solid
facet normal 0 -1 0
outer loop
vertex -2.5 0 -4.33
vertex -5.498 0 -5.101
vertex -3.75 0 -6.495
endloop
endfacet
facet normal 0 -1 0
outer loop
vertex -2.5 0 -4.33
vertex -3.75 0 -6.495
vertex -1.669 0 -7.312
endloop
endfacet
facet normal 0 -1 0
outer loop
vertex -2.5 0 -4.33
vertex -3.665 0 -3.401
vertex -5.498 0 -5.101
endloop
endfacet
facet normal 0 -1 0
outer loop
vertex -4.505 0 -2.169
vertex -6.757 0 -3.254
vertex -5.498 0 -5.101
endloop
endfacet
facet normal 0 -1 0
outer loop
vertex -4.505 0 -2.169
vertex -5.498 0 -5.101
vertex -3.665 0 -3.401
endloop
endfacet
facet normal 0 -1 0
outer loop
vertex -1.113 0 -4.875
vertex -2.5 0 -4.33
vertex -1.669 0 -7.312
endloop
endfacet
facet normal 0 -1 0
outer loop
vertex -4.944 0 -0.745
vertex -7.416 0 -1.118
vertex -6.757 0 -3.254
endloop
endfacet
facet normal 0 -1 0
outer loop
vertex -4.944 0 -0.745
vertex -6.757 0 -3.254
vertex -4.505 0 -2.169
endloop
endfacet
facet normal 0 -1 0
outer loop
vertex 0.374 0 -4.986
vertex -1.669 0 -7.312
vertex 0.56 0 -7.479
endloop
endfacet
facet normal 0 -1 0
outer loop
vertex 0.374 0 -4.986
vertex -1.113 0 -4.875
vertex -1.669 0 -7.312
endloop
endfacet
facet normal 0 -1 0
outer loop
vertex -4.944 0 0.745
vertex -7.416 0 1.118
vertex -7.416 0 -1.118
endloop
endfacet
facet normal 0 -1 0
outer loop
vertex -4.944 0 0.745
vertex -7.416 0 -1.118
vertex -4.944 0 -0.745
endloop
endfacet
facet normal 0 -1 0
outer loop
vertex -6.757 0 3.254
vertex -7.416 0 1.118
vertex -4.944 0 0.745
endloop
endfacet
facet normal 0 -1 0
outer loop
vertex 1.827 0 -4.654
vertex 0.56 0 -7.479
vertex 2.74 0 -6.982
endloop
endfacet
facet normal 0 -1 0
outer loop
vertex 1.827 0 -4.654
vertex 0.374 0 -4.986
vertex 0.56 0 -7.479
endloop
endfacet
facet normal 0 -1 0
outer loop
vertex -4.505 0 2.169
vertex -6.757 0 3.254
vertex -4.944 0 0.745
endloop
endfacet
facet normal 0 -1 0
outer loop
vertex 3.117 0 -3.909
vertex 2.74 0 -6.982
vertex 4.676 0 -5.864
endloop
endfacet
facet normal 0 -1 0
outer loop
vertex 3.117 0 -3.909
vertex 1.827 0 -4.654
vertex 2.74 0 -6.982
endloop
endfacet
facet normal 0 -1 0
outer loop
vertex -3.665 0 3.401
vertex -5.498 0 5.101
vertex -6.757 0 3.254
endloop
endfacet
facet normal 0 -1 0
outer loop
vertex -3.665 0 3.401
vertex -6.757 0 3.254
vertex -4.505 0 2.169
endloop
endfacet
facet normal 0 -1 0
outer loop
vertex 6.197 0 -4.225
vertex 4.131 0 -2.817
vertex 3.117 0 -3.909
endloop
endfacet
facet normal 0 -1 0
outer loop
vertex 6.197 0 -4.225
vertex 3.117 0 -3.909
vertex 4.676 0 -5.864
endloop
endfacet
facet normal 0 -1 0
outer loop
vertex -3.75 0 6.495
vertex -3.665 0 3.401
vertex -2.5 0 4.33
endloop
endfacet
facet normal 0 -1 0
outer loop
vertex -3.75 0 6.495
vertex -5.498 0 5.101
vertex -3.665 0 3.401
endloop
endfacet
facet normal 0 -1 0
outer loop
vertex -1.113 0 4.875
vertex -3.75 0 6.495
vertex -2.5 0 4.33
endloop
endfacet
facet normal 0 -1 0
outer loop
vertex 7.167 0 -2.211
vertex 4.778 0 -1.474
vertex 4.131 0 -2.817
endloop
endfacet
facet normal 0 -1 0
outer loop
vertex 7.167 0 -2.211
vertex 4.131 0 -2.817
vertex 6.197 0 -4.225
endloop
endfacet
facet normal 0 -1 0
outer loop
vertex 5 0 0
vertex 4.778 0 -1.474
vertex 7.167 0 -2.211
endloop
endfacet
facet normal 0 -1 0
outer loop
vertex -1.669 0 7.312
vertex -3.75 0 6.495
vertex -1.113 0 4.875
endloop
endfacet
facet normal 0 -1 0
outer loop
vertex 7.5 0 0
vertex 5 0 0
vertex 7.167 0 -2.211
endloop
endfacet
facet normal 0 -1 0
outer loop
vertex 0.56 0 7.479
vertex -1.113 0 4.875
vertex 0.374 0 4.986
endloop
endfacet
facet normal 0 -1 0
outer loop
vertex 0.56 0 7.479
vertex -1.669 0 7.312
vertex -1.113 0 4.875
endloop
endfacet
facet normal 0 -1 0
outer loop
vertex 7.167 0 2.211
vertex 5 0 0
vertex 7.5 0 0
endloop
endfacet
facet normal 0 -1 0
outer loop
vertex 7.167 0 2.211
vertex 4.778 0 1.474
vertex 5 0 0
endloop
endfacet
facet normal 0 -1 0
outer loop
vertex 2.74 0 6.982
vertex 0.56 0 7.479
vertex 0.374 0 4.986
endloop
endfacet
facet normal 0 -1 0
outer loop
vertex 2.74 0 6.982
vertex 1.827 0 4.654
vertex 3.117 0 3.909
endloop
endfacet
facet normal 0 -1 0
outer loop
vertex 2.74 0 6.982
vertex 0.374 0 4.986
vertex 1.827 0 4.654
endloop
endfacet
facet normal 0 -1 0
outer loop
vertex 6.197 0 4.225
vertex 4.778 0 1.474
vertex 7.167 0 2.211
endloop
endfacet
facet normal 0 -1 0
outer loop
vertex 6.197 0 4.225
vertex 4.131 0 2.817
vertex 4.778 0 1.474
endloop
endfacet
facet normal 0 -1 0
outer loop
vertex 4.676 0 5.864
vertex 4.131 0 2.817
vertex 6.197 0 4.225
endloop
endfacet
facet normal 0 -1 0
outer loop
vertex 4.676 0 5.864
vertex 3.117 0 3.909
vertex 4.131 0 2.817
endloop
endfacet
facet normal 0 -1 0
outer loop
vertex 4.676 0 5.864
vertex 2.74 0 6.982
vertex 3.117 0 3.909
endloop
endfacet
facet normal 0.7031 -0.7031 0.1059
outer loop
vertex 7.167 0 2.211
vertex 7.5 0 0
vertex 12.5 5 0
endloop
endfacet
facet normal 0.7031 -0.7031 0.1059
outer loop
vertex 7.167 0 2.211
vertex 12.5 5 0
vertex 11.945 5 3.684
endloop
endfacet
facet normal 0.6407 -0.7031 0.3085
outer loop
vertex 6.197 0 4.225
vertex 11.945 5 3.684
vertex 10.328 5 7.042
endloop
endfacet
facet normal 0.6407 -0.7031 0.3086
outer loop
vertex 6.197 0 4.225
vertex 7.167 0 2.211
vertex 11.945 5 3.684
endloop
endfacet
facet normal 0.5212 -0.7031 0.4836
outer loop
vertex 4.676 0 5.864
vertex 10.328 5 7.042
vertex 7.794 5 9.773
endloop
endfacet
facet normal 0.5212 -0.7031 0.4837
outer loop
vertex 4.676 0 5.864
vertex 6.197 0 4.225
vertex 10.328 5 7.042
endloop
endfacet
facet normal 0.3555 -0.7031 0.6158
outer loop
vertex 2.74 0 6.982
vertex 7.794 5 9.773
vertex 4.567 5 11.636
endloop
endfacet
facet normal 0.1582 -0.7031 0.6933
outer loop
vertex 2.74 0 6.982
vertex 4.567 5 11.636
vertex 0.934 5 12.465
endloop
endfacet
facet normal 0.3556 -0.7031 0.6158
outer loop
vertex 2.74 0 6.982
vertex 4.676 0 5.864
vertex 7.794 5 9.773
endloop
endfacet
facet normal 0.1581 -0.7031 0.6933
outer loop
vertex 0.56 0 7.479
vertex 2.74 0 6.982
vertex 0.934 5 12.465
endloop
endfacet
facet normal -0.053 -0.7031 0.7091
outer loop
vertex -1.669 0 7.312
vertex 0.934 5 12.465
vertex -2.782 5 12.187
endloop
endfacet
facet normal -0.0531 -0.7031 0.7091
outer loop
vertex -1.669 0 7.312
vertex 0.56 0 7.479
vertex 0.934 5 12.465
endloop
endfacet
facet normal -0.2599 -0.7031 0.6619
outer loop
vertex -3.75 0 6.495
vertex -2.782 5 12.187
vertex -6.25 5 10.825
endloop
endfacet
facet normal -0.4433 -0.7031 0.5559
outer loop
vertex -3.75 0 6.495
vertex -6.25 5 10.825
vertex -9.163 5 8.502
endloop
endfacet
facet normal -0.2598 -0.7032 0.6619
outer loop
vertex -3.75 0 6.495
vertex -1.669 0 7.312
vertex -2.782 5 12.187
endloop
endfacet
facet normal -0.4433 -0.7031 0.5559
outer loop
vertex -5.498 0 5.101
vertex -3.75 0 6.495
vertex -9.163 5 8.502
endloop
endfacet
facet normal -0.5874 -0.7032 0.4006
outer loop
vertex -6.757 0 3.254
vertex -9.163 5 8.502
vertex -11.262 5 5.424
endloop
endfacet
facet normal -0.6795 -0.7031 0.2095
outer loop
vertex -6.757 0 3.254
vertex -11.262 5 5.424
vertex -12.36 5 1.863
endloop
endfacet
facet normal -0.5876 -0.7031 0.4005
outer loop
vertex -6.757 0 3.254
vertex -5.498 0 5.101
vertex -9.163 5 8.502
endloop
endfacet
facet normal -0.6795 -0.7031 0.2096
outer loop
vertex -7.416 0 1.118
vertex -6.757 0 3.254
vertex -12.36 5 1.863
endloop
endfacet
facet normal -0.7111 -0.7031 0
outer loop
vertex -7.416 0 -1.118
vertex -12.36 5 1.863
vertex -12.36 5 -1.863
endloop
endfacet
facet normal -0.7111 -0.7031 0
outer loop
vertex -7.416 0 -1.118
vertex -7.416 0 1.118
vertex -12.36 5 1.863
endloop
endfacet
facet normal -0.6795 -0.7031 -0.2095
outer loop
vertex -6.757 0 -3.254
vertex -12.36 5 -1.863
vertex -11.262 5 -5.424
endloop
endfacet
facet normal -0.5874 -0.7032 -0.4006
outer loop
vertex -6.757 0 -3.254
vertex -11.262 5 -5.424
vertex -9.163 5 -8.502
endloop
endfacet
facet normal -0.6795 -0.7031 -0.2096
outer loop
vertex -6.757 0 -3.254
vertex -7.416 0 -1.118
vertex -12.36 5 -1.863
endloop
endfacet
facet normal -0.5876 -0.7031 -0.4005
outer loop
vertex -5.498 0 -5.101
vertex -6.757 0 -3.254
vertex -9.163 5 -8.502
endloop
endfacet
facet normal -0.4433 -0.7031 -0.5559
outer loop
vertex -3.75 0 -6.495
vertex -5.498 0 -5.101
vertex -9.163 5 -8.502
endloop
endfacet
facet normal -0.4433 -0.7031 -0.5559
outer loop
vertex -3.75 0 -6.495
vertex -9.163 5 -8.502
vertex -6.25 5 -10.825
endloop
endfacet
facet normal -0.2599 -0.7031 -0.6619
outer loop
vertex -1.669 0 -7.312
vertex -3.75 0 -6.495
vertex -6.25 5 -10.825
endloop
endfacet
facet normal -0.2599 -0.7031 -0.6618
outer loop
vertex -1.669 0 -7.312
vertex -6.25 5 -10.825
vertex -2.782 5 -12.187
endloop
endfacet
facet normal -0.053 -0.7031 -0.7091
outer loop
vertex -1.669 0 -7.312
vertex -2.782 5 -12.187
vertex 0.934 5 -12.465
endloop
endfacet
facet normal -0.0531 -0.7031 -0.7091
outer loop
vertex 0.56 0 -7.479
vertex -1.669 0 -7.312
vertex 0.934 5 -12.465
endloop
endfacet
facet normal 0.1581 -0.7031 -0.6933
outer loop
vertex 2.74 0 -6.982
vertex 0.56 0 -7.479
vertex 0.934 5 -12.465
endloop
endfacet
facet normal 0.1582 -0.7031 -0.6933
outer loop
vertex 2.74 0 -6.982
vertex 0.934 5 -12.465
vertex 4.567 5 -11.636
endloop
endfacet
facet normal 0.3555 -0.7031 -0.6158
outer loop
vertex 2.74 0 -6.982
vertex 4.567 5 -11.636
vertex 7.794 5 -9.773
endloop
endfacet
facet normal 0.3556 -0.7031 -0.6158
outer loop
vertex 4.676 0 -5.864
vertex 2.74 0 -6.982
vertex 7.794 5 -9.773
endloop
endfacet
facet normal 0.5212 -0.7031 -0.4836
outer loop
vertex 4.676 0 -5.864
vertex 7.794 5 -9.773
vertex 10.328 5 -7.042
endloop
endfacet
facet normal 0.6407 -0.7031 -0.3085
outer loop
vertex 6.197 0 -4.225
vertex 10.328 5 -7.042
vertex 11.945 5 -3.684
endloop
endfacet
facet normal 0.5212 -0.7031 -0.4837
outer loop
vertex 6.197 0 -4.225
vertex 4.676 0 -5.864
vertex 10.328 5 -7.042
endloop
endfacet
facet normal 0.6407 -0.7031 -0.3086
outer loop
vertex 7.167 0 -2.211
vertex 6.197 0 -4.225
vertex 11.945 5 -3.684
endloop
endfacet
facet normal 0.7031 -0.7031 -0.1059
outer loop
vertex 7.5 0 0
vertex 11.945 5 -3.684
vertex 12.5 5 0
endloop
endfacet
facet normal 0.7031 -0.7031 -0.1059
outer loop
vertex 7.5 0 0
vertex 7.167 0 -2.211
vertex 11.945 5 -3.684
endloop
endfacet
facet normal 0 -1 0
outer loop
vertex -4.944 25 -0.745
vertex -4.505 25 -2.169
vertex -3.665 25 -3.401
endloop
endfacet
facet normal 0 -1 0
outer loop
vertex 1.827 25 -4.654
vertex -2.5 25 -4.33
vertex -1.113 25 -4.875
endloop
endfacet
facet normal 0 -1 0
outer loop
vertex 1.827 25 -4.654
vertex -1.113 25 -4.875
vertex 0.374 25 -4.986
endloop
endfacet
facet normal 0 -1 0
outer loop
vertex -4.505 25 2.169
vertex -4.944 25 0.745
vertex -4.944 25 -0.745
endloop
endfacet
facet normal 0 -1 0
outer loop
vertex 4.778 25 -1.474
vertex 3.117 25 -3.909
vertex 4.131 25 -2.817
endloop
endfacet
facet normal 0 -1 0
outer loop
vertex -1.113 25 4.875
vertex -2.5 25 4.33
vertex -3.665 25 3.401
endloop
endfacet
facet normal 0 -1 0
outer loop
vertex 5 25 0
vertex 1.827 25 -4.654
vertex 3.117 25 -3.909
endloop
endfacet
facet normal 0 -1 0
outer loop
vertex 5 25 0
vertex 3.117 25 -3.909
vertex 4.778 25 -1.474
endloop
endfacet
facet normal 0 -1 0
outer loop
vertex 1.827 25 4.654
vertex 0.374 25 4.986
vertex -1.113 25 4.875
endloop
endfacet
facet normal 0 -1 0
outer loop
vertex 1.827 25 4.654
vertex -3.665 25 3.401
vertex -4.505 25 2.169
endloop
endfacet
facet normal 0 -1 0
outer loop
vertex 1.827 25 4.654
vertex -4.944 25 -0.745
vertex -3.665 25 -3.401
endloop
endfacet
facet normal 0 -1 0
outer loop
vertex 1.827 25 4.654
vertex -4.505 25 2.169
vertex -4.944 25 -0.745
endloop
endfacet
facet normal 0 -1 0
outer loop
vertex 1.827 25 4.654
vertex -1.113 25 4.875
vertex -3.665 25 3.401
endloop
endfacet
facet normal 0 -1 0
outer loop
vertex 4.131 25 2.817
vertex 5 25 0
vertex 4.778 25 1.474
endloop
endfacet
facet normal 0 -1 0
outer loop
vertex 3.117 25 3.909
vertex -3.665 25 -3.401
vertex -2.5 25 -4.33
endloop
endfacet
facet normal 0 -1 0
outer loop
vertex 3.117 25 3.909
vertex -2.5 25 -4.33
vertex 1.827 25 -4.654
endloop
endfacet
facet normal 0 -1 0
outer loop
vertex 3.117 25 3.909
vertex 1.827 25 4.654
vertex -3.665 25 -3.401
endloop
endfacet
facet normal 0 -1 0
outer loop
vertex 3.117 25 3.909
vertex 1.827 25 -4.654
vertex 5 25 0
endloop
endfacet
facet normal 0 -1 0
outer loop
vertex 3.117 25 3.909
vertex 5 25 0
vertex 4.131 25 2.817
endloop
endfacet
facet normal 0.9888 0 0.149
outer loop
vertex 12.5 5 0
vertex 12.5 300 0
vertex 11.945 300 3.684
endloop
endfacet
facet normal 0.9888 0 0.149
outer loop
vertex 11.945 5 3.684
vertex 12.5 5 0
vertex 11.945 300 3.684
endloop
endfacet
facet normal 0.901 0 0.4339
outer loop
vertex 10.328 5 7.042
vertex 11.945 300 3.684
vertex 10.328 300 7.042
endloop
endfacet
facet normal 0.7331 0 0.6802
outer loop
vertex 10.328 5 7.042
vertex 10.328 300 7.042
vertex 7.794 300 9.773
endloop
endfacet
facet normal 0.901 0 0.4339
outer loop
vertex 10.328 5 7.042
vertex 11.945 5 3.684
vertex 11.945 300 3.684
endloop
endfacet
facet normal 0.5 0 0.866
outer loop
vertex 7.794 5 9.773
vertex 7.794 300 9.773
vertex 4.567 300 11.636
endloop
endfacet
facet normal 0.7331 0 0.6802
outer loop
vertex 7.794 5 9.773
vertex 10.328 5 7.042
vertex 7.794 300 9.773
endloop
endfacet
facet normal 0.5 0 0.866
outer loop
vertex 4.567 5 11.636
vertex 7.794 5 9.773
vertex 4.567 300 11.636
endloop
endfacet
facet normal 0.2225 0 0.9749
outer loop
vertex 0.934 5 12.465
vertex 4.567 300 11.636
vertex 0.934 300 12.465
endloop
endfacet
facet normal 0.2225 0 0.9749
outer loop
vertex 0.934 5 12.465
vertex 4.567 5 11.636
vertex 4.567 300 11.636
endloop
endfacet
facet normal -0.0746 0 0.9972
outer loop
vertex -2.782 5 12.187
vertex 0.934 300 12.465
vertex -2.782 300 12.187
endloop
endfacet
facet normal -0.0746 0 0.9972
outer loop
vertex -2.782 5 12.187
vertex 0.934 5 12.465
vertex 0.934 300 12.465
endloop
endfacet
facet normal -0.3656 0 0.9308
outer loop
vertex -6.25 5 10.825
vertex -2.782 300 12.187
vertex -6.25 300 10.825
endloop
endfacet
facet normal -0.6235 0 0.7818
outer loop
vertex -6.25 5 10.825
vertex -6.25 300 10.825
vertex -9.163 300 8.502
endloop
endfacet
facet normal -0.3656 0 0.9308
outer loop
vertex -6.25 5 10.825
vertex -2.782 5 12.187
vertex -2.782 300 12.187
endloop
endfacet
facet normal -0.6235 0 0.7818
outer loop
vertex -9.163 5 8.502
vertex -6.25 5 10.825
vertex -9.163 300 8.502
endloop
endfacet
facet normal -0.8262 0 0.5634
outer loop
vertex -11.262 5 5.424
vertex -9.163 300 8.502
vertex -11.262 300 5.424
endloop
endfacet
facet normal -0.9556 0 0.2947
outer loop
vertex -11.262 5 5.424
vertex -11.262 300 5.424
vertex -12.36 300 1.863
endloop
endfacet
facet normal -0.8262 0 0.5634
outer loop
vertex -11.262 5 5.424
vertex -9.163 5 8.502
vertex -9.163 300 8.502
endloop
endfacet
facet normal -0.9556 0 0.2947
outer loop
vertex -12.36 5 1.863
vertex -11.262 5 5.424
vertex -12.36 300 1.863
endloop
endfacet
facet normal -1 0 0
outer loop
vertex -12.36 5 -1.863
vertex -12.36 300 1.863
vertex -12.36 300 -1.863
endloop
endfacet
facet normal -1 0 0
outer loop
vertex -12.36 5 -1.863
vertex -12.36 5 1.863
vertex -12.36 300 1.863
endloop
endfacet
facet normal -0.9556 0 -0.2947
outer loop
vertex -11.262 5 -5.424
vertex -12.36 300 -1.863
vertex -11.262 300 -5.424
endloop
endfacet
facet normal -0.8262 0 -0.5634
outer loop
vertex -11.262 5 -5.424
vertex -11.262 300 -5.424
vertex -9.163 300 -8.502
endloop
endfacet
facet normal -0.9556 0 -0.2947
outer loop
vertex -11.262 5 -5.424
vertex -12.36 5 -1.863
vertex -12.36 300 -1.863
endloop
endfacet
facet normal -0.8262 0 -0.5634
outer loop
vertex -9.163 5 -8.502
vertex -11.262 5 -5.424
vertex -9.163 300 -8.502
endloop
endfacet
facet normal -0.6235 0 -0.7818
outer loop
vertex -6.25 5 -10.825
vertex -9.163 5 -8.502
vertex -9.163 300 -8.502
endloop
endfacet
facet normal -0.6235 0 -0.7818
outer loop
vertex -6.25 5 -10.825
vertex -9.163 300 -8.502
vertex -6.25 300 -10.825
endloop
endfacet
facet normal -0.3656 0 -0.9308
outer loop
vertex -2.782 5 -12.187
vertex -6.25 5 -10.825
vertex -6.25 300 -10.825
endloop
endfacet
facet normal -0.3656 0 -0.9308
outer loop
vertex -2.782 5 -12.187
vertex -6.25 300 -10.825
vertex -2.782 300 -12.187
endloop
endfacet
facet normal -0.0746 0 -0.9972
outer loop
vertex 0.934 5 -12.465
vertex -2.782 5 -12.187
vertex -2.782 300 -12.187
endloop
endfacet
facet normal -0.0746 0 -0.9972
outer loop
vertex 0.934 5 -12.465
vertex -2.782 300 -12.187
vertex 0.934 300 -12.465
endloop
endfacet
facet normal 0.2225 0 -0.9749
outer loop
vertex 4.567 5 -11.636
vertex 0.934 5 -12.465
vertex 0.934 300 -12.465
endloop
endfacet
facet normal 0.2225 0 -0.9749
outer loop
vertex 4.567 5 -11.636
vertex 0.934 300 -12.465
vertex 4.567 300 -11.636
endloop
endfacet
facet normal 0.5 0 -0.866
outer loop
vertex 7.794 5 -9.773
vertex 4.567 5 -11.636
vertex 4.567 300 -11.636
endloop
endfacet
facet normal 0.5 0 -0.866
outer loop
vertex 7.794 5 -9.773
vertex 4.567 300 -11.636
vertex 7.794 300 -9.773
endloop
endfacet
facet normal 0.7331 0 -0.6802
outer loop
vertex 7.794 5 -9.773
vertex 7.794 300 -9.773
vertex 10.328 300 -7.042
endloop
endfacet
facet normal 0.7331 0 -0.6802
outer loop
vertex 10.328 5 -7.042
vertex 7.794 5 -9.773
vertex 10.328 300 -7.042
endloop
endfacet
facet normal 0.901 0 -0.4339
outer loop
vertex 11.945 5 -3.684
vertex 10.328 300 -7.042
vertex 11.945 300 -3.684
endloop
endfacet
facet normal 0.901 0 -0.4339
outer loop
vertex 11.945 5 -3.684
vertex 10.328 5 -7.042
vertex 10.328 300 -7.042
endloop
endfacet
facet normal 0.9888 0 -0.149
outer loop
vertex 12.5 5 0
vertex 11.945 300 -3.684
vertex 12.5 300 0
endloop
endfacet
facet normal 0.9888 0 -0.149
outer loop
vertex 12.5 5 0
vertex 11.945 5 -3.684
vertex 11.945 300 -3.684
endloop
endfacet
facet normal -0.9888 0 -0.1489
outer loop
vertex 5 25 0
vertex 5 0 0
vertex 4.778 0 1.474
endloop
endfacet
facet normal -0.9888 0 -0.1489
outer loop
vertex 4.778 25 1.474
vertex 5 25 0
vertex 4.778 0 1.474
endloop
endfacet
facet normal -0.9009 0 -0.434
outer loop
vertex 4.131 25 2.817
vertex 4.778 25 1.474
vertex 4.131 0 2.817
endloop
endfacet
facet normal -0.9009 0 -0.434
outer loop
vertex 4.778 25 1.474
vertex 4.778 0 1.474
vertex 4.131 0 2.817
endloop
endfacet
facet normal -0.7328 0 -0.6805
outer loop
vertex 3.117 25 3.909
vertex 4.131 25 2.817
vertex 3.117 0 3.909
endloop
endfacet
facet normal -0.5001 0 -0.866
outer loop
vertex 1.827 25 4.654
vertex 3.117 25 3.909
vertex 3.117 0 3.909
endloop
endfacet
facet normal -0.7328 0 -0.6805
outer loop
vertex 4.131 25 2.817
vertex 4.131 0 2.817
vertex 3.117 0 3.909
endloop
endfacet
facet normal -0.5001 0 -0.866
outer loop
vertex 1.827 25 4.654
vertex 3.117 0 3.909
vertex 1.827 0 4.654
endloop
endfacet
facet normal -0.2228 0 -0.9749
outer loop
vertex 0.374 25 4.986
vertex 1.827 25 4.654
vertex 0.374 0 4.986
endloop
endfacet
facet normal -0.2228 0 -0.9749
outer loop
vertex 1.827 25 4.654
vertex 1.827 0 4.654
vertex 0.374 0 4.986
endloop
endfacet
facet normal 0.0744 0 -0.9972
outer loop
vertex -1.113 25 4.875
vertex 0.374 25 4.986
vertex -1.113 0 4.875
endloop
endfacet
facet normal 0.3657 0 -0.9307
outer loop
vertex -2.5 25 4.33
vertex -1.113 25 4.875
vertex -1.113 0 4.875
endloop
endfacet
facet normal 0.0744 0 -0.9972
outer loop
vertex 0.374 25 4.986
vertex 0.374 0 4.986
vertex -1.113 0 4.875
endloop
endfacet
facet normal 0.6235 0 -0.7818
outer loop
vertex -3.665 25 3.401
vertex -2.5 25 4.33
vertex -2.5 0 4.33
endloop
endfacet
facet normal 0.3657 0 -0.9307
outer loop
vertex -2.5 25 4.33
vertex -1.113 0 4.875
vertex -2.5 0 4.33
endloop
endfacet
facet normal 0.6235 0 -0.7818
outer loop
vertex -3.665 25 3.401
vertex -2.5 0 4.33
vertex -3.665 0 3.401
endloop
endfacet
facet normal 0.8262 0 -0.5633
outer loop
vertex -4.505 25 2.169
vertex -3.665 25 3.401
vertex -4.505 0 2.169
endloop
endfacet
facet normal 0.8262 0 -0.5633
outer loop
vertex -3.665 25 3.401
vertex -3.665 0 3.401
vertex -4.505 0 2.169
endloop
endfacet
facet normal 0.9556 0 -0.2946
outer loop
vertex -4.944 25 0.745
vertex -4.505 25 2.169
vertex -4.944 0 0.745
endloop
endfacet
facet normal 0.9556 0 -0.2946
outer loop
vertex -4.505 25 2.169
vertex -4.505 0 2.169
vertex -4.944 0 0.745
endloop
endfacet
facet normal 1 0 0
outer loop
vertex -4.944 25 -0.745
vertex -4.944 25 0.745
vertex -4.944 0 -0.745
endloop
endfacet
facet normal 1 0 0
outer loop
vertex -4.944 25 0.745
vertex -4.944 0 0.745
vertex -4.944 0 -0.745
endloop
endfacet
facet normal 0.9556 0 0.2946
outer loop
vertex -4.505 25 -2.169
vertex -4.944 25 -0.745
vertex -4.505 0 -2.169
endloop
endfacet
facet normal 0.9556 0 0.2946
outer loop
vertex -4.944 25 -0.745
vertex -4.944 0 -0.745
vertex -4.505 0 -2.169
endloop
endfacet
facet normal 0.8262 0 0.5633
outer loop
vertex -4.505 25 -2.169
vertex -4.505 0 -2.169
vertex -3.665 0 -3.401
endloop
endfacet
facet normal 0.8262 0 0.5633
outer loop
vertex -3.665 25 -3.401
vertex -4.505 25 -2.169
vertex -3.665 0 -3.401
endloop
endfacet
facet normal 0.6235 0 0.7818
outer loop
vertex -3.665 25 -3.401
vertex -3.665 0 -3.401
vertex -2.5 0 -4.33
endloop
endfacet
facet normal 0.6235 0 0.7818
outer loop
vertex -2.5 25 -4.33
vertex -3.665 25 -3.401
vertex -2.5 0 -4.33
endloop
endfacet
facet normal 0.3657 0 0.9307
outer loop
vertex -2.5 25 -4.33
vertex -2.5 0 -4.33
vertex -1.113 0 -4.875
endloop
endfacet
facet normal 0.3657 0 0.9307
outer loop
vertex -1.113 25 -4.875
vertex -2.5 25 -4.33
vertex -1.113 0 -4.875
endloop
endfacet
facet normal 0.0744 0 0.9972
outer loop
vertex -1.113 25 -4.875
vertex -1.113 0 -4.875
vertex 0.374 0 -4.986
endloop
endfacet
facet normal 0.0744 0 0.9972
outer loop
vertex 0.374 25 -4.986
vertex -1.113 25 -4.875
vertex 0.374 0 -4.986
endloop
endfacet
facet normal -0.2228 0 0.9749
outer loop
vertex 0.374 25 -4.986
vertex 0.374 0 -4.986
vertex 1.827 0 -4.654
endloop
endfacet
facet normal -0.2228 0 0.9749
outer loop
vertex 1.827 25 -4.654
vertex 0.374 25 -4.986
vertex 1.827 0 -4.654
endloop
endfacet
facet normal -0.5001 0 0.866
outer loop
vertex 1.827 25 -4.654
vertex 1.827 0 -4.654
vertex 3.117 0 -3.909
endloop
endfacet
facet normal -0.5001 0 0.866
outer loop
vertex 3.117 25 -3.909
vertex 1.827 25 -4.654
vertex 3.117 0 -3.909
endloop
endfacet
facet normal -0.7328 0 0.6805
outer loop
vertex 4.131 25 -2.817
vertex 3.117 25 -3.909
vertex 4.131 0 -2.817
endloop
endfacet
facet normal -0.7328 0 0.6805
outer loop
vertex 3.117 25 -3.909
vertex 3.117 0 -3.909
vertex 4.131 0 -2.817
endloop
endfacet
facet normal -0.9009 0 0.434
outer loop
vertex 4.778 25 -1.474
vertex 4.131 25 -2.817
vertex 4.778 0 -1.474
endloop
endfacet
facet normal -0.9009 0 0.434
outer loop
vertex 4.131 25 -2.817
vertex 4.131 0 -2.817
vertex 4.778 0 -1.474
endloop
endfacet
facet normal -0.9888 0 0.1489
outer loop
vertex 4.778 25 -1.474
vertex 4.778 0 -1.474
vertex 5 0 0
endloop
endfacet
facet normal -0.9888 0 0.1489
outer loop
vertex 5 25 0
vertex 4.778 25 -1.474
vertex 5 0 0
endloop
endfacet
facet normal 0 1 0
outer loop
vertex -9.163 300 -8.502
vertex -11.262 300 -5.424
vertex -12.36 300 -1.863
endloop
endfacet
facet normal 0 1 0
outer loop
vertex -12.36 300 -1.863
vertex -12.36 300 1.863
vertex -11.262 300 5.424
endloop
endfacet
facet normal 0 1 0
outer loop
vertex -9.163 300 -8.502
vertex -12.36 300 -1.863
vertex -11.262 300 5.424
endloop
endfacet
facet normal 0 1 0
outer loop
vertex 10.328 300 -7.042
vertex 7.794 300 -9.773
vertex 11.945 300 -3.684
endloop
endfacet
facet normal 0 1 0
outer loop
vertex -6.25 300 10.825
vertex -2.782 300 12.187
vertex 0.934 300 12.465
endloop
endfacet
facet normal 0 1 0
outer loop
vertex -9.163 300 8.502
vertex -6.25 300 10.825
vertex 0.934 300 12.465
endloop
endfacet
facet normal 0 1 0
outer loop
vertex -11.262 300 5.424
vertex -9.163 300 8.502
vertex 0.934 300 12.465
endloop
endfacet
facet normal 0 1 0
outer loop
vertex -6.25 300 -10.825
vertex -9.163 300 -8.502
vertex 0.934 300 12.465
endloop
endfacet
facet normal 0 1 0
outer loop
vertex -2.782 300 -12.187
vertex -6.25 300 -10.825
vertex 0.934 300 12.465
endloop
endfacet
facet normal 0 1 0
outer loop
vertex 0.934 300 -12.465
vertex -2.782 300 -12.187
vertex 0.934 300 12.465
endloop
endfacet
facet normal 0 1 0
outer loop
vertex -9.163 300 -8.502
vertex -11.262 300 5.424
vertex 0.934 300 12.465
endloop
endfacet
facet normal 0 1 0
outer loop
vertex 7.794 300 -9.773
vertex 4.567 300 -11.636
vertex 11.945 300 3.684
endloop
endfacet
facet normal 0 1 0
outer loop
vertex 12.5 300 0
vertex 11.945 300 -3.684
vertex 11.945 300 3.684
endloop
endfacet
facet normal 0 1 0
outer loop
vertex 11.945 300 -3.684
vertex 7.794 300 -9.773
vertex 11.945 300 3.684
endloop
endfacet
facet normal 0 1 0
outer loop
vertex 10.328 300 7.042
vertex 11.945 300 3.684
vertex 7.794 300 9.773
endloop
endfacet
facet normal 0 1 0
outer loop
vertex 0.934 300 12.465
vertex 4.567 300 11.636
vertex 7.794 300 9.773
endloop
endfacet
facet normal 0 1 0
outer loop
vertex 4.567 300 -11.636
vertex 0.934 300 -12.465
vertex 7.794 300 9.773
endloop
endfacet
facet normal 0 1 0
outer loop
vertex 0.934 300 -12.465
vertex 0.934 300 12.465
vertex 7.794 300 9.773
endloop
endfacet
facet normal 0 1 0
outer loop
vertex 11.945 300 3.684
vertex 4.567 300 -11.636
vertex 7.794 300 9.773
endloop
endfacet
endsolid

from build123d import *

# Parameters (mm, degrees)
F0_R     = 12.5
F1_DEPTH = 300
F2_R     = 5
F3_DEPTH = 25
F4_SIZE  = 5


with BuildPart() as f1:
    # F0 (on Front) → F1 (new body)
    with BuildSketch(Plane.XZ):
        Circle(F0_R)
    extrude(amount=-F1_DEPTH)

    # F2 (on face) → F3 (cut)
    with BuildSketch(Plane.XZ):
        Circle(F2_R)
    extrude(amount=-F3_DEPTH, mode=Mode.SUBTRACT)

    # F4
    f4_edges = [f1.edges().sort_by_distance(p)[0] for p in [
        (-12.5, 0, 0),
    ]]
    chamfer(f4_edges, length=F4_SIZE)


solid = f1.part
